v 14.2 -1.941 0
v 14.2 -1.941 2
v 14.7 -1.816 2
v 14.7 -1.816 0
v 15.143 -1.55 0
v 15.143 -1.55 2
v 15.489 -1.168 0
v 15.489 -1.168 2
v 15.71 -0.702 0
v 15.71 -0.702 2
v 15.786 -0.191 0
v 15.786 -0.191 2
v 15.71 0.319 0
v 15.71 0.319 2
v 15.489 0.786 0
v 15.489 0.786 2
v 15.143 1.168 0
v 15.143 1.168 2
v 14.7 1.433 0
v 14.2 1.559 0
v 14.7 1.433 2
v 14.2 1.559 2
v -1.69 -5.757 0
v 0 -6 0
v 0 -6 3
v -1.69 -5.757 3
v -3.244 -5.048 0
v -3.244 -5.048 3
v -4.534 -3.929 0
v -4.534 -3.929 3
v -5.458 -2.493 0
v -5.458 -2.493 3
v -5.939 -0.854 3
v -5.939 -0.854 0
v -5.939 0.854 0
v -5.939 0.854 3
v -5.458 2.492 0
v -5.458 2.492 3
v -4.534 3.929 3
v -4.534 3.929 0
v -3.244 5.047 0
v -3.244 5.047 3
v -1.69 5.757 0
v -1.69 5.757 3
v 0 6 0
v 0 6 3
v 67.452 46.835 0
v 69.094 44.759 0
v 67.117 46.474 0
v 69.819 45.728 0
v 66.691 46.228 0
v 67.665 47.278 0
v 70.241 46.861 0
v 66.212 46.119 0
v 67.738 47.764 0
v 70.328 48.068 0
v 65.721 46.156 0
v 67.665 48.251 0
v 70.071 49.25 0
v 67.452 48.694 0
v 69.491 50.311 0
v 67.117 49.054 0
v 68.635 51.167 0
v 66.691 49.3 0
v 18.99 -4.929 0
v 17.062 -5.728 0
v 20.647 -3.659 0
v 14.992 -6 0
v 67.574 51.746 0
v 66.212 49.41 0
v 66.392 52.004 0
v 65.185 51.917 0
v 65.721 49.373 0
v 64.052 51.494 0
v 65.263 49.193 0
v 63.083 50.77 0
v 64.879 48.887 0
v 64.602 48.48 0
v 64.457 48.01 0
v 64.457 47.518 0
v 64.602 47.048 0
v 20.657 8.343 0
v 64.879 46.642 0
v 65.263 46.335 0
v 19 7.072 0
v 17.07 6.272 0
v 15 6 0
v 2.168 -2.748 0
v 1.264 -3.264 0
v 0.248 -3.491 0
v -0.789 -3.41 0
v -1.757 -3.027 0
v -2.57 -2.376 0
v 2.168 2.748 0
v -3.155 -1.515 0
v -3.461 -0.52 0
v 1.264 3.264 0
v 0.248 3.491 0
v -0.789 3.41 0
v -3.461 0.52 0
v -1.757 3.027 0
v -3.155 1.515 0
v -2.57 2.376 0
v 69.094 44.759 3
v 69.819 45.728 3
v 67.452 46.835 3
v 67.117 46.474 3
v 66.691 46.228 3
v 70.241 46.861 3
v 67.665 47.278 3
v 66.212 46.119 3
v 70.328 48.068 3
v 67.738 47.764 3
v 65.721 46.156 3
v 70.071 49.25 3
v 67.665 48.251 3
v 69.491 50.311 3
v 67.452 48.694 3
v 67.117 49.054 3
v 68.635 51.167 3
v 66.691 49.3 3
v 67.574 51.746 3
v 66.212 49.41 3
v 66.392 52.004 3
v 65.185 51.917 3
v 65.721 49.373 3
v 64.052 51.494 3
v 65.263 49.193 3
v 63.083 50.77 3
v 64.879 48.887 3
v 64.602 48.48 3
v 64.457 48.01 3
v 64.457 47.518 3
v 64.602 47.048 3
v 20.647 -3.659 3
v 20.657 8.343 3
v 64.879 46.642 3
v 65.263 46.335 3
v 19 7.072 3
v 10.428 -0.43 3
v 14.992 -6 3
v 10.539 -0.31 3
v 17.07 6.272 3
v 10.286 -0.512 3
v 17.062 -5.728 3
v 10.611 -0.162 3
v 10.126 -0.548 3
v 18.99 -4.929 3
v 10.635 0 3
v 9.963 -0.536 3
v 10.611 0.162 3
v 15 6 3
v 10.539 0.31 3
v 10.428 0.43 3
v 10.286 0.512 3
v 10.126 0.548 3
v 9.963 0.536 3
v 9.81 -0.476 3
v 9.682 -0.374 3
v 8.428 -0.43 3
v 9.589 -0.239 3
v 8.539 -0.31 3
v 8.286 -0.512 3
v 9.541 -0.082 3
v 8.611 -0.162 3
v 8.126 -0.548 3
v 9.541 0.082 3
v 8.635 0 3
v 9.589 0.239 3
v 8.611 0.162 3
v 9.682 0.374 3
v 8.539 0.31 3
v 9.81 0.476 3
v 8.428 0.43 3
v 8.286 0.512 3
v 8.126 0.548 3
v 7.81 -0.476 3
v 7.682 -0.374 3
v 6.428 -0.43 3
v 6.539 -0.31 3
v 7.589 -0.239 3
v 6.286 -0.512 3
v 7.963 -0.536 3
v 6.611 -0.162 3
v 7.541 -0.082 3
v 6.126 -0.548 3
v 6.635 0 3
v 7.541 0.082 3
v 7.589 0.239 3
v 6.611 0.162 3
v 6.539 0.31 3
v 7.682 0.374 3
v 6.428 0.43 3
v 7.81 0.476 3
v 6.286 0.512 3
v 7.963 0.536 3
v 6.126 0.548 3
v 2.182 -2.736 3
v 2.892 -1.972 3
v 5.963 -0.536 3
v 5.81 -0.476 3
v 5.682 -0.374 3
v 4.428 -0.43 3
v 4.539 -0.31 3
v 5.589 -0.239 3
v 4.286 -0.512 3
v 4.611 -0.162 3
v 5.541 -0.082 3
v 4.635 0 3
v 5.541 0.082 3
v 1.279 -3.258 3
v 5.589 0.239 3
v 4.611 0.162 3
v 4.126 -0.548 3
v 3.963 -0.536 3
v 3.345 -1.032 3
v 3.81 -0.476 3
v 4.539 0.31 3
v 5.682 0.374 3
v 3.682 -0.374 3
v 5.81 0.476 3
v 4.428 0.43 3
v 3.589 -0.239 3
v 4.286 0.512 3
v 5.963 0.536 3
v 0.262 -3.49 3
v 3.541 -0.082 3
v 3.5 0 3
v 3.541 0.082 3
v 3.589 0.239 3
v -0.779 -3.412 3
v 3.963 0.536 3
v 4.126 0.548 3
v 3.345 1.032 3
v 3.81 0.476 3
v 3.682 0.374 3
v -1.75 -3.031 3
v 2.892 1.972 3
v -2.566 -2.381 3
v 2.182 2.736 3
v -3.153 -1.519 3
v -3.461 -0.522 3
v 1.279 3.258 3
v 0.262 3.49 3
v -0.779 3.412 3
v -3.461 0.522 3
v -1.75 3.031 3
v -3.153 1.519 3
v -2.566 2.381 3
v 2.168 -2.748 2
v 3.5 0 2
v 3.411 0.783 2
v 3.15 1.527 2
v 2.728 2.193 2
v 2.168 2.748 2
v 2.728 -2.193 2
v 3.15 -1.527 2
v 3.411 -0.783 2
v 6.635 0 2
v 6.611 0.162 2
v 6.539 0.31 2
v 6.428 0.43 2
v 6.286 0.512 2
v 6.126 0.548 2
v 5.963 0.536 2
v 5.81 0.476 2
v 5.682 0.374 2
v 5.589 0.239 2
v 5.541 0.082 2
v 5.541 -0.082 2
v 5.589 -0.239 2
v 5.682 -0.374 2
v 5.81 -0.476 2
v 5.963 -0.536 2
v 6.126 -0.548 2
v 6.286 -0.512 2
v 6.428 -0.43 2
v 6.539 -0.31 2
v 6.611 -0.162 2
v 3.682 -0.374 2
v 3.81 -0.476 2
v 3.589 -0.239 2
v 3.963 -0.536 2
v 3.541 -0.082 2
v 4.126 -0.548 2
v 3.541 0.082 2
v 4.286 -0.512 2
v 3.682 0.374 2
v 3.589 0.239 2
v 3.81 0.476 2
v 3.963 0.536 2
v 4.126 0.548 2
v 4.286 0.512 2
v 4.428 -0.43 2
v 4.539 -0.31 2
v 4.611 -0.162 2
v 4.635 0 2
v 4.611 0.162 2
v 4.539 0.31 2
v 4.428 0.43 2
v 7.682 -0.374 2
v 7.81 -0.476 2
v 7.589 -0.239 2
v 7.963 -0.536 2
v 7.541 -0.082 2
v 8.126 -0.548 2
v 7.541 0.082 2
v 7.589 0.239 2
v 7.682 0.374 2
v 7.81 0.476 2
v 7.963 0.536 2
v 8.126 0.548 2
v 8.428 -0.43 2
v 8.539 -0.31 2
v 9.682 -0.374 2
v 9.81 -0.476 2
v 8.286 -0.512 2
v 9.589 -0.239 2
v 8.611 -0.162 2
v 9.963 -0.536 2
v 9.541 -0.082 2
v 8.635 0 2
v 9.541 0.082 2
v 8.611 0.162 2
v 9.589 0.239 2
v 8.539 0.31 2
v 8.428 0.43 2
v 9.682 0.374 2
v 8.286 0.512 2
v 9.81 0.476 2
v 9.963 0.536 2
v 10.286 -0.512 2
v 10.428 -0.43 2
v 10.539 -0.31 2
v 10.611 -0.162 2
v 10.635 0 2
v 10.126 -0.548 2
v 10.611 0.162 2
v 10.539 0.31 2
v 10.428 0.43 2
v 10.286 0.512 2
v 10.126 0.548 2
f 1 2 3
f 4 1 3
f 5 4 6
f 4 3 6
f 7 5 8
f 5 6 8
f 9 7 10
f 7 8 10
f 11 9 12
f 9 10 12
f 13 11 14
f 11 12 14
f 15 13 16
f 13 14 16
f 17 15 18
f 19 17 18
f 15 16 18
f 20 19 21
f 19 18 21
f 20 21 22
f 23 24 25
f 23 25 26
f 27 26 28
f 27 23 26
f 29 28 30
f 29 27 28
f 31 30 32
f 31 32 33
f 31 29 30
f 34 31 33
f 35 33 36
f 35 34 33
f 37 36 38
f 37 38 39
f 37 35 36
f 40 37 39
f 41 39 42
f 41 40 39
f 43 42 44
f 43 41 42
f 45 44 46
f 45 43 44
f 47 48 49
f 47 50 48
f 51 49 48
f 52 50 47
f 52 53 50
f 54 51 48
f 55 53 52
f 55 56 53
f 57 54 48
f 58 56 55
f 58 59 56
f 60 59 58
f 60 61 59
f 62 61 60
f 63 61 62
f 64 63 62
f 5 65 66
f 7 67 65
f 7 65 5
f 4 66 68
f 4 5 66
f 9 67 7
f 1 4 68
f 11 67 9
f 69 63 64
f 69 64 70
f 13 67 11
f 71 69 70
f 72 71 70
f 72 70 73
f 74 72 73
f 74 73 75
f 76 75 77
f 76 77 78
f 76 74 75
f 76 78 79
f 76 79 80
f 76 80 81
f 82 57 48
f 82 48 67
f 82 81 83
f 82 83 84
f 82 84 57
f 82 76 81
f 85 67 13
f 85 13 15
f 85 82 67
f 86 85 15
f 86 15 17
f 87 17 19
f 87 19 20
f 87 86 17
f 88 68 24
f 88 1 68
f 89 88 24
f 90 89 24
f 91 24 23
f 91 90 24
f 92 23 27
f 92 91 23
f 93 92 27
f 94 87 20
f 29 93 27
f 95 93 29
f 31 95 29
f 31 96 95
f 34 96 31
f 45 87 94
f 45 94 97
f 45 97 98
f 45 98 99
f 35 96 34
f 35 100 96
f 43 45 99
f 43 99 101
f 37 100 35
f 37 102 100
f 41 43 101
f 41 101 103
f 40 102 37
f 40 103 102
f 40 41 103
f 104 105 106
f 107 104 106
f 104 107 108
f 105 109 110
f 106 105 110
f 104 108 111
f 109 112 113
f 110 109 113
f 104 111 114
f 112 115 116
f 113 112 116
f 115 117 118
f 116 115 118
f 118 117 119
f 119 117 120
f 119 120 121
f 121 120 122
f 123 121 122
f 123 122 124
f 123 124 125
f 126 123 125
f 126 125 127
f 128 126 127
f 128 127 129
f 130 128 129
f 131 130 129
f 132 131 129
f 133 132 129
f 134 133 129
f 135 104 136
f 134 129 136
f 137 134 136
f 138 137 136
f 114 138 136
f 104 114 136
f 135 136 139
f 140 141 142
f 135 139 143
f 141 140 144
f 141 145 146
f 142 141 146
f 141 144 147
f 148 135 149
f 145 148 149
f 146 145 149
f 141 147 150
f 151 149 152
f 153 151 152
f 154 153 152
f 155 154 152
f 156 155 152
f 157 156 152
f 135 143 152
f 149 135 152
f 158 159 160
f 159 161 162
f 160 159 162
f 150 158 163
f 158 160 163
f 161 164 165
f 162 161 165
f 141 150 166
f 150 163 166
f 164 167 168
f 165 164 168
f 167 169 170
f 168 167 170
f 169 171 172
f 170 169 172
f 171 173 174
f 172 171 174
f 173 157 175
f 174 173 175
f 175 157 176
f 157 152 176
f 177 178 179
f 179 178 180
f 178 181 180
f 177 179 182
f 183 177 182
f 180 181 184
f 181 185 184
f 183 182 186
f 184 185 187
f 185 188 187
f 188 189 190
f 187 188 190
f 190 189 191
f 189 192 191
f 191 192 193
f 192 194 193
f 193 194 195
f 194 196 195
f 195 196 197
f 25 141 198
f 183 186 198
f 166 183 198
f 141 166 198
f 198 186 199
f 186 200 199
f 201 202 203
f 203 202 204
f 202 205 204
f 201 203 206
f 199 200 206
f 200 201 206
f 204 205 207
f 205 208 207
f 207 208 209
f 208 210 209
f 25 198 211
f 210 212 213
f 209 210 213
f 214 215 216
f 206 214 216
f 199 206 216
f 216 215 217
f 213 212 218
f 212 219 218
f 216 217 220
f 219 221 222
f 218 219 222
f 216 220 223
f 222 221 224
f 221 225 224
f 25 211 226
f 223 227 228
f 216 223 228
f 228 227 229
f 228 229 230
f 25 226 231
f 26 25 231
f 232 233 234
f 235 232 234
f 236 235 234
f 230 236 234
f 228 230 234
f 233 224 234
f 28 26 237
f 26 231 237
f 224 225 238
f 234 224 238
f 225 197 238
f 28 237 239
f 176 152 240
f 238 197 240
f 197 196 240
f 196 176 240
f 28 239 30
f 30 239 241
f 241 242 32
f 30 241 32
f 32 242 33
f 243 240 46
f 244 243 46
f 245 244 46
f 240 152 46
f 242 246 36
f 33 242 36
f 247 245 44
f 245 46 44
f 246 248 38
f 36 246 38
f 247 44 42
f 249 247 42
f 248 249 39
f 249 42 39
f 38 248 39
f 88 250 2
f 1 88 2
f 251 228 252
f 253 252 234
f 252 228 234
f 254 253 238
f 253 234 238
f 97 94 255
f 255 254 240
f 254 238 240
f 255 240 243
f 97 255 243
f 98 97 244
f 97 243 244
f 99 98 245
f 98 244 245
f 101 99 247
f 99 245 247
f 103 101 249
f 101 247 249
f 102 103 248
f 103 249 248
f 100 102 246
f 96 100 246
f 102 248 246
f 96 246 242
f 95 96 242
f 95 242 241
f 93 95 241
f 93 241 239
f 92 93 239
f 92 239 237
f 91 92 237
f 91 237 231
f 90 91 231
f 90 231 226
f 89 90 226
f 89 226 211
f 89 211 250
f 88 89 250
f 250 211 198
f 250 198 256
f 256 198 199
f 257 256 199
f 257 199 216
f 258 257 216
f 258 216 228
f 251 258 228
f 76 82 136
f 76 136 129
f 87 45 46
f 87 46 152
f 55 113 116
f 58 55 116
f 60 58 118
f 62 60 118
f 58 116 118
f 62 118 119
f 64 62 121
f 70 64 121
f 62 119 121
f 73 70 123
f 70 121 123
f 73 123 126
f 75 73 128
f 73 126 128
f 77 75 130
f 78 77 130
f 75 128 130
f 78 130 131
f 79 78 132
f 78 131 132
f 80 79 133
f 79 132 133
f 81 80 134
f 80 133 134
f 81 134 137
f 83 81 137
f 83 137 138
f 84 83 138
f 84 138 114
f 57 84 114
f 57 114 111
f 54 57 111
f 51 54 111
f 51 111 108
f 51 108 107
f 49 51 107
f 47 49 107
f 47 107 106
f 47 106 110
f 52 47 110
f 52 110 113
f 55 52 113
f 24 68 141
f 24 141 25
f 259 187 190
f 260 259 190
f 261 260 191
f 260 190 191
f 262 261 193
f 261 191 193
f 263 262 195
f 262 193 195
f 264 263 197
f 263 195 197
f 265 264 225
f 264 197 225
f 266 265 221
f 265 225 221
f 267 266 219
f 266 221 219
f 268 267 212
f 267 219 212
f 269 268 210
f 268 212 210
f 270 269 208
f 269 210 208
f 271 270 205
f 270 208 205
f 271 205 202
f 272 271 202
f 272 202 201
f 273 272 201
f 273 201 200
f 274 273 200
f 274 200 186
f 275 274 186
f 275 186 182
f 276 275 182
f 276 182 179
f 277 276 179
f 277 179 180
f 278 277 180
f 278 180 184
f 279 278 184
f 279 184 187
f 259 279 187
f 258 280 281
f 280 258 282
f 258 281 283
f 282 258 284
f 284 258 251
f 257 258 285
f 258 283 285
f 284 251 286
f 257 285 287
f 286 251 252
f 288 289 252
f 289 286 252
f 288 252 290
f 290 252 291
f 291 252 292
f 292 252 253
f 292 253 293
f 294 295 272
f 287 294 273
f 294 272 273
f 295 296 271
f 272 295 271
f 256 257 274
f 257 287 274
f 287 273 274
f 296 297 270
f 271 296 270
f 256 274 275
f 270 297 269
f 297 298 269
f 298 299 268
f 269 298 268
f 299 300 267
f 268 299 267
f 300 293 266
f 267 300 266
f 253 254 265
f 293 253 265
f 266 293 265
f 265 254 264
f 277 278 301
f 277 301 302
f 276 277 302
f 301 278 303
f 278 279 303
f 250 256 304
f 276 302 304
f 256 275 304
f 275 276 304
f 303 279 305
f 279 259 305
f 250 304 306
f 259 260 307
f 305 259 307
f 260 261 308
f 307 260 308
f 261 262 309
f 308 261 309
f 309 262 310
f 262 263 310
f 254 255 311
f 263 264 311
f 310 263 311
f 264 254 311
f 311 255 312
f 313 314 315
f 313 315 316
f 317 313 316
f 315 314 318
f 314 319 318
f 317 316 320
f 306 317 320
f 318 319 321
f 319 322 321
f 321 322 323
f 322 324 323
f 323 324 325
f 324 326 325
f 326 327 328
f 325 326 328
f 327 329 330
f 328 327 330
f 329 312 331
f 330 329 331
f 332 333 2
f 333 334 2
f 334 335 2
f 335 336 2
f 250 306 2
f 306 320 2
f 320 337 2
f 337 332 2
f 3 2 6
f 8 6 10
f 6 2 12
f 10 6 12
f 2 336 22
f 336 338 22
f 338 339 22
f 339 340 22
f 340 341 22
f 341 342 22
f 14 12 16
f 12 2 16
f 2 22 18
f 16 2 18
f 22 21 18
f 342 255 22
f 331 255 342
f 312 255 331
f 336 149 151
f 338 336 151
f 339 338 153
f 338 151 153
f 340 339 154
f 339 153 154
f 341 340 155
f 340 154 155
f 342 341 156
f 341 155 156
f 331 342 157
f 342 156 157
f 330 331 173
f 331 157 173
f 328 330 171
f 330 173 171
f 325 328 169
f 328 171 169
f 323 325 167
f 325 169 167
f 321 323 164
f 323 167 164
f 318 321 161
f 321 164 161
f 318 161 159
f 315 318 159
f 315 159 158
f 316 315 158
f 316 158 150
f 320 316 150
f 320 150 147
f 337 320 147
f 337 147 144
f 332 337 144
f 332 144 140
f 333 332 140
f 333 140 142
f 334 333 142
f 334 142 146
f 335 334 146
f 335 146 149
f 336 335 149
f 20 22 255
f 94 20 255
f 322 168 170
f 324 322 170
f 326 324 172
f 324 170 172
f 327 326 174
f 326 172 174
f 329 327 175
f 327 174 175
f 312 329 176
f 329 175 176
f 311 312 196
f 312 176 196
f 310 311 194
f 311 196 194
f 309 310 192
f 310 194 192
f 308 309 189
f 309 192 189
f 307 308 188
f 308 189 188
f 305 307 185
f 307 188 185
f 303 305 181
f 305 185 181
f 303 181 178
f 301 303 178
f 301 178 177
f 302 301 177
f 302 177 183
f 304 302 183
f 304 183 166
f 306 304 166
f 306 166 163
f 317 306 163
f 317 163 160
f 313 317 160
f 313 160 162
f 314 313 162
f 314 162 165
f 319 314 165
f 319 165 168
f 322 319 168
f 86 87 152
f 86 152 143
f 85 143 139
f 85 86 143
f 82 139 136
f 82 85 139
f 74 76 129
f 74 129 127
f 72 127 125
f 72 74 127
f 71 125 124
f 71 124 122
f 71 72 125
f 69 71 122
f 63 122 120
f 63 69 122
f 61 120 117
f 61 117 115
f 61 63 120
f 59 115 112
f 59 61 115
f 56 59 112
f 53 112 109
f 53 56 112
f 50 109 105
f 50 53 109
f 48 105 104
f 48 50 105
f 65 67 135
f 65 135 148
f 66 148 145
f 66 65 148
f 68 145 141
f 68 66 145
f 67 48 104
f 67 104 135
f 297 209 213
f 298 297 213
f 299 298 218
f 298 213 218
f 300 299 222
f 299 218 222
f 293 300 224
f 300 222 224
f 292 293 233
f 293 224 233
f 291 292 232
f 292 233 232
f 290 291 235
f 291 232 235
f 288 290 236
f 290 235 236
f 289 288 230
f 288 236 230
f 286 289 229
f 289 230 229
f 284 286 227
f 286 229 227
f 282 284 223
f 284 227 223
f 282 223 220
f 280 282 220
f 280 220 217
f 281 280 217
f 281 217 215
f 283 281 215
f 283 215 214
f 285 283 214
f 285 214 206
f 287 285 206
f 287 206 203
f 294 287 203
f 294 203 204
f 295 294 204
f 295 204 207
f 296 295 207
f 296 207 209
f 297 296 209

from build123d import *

# Parameters (mm, degrees)
EXTRUDE_1_DEPTH      = 3
SKETCH_9_R           = 3.5
SKETCH_9_R_2         = 1.65
CUT_EXTRUDE_5_DEPTH  = 6
CUT_EXTRUDE_START    = -1
CUT_EXTRUDE_7_DEPTH  = 87.53280603
SKETCH_13_R          = 0.55
CUT_EXTRUDE_10_DEPTH = 88.53280603


with BuildPart() as part:
    # 草图1 → 凸台-拉伸1 (new body)
    with BuildSketch(Plane.XY):
        with BuildLine():
            Line((14.999750012, 5.999750001), (0.000249999, 5.999750001))
            ThreePointArc((0.000249999, 5.999750001), (-5.999750001, -0.000249999), (0.000249999, -6.000249999))
            Line((0.000249999, -6.000249999), (14.991867742, -6.000249999))
            ThreePointArc((14.991867742, -6.000249999), (18.052240297, -5.391739688), (20.647045788, -3.658779955))
            Line((20.647045788, -3.658779955), (69.093668761, 44.759144982))
            ThreePointArc((69.093668761, 44.759144982), (69.093668761, 50.769552622), (63.083261121, 50.769552622))
            Line((63.083261121, 50.769552622), (20.656854249, 8.343145751))
            ThreePointArc((20.656854249, 8.343145751), (18.061380786, 6.60878139), (14.999750012, 5.999750001))
        make_face()
    extrude(amount=EXTRUDE_1_DEPTH)

    # 草图9 → 切除-拉伸5 (cut)
    with BuildSketch(Plane.XY.offset(3)):
        Circle(SKETCH_9_R)
        with Locations((66.088464941, 47.764348802)):
            Circle(SKETCH_9_R_2)
    extrude(amount=-CUT_EXTRUDE_5_DEPTH, mode=Mode.SUBTRACT)

    # 草图9<4> → 切除-拉伸7 (cut, through all)
    with BuildSketch(Plane.XY.offset(3).offset(CUT_EXTRUDE_START)):
        with BuildLine():
            Line((14.2, 1.55872543), (2.168203804, 2.747524752))
            ThreePointArc((2.168203804, 2.747524752), (3.149501017, 1.526644472), (3.5, 0))
            ThreePointArc((3.5, 0), (3.149501017, -1.526644472), (2.168203804, -2.747524752))
            Line((2.168203804, -2.747524752), (14.2, -1.94127457))
            ThreePointArc((14.2, -1.94127457), (15.785612929, -0.19127457), (14.2, 1.55872543))
        make_face()
    extrude(amount=-CUT_EXTRUDE_7_DEPTH, mode=Mode.SUBTRACT)

    # 草图13 → 切除-拉伸10 (cut, through all)
    with BuildSketch(Plane.XY.offset(3)):
        with Locations((4.085, 0)):
            Circle(SKETCH_13_R)
        with Locations((6.085, 0)):
            Circle(SKETCH_13_R)
        with Locations((8.085, 0)):
            Circle(SKETCH_13_R)
        with Locations((10.085, 0)):
            Circle(SKETCH_13_R)
    extrude(amount=-CUT_EXTRUDE_10_DEPTH, mode=Mode.SUBTRACT)


solid = part.part
